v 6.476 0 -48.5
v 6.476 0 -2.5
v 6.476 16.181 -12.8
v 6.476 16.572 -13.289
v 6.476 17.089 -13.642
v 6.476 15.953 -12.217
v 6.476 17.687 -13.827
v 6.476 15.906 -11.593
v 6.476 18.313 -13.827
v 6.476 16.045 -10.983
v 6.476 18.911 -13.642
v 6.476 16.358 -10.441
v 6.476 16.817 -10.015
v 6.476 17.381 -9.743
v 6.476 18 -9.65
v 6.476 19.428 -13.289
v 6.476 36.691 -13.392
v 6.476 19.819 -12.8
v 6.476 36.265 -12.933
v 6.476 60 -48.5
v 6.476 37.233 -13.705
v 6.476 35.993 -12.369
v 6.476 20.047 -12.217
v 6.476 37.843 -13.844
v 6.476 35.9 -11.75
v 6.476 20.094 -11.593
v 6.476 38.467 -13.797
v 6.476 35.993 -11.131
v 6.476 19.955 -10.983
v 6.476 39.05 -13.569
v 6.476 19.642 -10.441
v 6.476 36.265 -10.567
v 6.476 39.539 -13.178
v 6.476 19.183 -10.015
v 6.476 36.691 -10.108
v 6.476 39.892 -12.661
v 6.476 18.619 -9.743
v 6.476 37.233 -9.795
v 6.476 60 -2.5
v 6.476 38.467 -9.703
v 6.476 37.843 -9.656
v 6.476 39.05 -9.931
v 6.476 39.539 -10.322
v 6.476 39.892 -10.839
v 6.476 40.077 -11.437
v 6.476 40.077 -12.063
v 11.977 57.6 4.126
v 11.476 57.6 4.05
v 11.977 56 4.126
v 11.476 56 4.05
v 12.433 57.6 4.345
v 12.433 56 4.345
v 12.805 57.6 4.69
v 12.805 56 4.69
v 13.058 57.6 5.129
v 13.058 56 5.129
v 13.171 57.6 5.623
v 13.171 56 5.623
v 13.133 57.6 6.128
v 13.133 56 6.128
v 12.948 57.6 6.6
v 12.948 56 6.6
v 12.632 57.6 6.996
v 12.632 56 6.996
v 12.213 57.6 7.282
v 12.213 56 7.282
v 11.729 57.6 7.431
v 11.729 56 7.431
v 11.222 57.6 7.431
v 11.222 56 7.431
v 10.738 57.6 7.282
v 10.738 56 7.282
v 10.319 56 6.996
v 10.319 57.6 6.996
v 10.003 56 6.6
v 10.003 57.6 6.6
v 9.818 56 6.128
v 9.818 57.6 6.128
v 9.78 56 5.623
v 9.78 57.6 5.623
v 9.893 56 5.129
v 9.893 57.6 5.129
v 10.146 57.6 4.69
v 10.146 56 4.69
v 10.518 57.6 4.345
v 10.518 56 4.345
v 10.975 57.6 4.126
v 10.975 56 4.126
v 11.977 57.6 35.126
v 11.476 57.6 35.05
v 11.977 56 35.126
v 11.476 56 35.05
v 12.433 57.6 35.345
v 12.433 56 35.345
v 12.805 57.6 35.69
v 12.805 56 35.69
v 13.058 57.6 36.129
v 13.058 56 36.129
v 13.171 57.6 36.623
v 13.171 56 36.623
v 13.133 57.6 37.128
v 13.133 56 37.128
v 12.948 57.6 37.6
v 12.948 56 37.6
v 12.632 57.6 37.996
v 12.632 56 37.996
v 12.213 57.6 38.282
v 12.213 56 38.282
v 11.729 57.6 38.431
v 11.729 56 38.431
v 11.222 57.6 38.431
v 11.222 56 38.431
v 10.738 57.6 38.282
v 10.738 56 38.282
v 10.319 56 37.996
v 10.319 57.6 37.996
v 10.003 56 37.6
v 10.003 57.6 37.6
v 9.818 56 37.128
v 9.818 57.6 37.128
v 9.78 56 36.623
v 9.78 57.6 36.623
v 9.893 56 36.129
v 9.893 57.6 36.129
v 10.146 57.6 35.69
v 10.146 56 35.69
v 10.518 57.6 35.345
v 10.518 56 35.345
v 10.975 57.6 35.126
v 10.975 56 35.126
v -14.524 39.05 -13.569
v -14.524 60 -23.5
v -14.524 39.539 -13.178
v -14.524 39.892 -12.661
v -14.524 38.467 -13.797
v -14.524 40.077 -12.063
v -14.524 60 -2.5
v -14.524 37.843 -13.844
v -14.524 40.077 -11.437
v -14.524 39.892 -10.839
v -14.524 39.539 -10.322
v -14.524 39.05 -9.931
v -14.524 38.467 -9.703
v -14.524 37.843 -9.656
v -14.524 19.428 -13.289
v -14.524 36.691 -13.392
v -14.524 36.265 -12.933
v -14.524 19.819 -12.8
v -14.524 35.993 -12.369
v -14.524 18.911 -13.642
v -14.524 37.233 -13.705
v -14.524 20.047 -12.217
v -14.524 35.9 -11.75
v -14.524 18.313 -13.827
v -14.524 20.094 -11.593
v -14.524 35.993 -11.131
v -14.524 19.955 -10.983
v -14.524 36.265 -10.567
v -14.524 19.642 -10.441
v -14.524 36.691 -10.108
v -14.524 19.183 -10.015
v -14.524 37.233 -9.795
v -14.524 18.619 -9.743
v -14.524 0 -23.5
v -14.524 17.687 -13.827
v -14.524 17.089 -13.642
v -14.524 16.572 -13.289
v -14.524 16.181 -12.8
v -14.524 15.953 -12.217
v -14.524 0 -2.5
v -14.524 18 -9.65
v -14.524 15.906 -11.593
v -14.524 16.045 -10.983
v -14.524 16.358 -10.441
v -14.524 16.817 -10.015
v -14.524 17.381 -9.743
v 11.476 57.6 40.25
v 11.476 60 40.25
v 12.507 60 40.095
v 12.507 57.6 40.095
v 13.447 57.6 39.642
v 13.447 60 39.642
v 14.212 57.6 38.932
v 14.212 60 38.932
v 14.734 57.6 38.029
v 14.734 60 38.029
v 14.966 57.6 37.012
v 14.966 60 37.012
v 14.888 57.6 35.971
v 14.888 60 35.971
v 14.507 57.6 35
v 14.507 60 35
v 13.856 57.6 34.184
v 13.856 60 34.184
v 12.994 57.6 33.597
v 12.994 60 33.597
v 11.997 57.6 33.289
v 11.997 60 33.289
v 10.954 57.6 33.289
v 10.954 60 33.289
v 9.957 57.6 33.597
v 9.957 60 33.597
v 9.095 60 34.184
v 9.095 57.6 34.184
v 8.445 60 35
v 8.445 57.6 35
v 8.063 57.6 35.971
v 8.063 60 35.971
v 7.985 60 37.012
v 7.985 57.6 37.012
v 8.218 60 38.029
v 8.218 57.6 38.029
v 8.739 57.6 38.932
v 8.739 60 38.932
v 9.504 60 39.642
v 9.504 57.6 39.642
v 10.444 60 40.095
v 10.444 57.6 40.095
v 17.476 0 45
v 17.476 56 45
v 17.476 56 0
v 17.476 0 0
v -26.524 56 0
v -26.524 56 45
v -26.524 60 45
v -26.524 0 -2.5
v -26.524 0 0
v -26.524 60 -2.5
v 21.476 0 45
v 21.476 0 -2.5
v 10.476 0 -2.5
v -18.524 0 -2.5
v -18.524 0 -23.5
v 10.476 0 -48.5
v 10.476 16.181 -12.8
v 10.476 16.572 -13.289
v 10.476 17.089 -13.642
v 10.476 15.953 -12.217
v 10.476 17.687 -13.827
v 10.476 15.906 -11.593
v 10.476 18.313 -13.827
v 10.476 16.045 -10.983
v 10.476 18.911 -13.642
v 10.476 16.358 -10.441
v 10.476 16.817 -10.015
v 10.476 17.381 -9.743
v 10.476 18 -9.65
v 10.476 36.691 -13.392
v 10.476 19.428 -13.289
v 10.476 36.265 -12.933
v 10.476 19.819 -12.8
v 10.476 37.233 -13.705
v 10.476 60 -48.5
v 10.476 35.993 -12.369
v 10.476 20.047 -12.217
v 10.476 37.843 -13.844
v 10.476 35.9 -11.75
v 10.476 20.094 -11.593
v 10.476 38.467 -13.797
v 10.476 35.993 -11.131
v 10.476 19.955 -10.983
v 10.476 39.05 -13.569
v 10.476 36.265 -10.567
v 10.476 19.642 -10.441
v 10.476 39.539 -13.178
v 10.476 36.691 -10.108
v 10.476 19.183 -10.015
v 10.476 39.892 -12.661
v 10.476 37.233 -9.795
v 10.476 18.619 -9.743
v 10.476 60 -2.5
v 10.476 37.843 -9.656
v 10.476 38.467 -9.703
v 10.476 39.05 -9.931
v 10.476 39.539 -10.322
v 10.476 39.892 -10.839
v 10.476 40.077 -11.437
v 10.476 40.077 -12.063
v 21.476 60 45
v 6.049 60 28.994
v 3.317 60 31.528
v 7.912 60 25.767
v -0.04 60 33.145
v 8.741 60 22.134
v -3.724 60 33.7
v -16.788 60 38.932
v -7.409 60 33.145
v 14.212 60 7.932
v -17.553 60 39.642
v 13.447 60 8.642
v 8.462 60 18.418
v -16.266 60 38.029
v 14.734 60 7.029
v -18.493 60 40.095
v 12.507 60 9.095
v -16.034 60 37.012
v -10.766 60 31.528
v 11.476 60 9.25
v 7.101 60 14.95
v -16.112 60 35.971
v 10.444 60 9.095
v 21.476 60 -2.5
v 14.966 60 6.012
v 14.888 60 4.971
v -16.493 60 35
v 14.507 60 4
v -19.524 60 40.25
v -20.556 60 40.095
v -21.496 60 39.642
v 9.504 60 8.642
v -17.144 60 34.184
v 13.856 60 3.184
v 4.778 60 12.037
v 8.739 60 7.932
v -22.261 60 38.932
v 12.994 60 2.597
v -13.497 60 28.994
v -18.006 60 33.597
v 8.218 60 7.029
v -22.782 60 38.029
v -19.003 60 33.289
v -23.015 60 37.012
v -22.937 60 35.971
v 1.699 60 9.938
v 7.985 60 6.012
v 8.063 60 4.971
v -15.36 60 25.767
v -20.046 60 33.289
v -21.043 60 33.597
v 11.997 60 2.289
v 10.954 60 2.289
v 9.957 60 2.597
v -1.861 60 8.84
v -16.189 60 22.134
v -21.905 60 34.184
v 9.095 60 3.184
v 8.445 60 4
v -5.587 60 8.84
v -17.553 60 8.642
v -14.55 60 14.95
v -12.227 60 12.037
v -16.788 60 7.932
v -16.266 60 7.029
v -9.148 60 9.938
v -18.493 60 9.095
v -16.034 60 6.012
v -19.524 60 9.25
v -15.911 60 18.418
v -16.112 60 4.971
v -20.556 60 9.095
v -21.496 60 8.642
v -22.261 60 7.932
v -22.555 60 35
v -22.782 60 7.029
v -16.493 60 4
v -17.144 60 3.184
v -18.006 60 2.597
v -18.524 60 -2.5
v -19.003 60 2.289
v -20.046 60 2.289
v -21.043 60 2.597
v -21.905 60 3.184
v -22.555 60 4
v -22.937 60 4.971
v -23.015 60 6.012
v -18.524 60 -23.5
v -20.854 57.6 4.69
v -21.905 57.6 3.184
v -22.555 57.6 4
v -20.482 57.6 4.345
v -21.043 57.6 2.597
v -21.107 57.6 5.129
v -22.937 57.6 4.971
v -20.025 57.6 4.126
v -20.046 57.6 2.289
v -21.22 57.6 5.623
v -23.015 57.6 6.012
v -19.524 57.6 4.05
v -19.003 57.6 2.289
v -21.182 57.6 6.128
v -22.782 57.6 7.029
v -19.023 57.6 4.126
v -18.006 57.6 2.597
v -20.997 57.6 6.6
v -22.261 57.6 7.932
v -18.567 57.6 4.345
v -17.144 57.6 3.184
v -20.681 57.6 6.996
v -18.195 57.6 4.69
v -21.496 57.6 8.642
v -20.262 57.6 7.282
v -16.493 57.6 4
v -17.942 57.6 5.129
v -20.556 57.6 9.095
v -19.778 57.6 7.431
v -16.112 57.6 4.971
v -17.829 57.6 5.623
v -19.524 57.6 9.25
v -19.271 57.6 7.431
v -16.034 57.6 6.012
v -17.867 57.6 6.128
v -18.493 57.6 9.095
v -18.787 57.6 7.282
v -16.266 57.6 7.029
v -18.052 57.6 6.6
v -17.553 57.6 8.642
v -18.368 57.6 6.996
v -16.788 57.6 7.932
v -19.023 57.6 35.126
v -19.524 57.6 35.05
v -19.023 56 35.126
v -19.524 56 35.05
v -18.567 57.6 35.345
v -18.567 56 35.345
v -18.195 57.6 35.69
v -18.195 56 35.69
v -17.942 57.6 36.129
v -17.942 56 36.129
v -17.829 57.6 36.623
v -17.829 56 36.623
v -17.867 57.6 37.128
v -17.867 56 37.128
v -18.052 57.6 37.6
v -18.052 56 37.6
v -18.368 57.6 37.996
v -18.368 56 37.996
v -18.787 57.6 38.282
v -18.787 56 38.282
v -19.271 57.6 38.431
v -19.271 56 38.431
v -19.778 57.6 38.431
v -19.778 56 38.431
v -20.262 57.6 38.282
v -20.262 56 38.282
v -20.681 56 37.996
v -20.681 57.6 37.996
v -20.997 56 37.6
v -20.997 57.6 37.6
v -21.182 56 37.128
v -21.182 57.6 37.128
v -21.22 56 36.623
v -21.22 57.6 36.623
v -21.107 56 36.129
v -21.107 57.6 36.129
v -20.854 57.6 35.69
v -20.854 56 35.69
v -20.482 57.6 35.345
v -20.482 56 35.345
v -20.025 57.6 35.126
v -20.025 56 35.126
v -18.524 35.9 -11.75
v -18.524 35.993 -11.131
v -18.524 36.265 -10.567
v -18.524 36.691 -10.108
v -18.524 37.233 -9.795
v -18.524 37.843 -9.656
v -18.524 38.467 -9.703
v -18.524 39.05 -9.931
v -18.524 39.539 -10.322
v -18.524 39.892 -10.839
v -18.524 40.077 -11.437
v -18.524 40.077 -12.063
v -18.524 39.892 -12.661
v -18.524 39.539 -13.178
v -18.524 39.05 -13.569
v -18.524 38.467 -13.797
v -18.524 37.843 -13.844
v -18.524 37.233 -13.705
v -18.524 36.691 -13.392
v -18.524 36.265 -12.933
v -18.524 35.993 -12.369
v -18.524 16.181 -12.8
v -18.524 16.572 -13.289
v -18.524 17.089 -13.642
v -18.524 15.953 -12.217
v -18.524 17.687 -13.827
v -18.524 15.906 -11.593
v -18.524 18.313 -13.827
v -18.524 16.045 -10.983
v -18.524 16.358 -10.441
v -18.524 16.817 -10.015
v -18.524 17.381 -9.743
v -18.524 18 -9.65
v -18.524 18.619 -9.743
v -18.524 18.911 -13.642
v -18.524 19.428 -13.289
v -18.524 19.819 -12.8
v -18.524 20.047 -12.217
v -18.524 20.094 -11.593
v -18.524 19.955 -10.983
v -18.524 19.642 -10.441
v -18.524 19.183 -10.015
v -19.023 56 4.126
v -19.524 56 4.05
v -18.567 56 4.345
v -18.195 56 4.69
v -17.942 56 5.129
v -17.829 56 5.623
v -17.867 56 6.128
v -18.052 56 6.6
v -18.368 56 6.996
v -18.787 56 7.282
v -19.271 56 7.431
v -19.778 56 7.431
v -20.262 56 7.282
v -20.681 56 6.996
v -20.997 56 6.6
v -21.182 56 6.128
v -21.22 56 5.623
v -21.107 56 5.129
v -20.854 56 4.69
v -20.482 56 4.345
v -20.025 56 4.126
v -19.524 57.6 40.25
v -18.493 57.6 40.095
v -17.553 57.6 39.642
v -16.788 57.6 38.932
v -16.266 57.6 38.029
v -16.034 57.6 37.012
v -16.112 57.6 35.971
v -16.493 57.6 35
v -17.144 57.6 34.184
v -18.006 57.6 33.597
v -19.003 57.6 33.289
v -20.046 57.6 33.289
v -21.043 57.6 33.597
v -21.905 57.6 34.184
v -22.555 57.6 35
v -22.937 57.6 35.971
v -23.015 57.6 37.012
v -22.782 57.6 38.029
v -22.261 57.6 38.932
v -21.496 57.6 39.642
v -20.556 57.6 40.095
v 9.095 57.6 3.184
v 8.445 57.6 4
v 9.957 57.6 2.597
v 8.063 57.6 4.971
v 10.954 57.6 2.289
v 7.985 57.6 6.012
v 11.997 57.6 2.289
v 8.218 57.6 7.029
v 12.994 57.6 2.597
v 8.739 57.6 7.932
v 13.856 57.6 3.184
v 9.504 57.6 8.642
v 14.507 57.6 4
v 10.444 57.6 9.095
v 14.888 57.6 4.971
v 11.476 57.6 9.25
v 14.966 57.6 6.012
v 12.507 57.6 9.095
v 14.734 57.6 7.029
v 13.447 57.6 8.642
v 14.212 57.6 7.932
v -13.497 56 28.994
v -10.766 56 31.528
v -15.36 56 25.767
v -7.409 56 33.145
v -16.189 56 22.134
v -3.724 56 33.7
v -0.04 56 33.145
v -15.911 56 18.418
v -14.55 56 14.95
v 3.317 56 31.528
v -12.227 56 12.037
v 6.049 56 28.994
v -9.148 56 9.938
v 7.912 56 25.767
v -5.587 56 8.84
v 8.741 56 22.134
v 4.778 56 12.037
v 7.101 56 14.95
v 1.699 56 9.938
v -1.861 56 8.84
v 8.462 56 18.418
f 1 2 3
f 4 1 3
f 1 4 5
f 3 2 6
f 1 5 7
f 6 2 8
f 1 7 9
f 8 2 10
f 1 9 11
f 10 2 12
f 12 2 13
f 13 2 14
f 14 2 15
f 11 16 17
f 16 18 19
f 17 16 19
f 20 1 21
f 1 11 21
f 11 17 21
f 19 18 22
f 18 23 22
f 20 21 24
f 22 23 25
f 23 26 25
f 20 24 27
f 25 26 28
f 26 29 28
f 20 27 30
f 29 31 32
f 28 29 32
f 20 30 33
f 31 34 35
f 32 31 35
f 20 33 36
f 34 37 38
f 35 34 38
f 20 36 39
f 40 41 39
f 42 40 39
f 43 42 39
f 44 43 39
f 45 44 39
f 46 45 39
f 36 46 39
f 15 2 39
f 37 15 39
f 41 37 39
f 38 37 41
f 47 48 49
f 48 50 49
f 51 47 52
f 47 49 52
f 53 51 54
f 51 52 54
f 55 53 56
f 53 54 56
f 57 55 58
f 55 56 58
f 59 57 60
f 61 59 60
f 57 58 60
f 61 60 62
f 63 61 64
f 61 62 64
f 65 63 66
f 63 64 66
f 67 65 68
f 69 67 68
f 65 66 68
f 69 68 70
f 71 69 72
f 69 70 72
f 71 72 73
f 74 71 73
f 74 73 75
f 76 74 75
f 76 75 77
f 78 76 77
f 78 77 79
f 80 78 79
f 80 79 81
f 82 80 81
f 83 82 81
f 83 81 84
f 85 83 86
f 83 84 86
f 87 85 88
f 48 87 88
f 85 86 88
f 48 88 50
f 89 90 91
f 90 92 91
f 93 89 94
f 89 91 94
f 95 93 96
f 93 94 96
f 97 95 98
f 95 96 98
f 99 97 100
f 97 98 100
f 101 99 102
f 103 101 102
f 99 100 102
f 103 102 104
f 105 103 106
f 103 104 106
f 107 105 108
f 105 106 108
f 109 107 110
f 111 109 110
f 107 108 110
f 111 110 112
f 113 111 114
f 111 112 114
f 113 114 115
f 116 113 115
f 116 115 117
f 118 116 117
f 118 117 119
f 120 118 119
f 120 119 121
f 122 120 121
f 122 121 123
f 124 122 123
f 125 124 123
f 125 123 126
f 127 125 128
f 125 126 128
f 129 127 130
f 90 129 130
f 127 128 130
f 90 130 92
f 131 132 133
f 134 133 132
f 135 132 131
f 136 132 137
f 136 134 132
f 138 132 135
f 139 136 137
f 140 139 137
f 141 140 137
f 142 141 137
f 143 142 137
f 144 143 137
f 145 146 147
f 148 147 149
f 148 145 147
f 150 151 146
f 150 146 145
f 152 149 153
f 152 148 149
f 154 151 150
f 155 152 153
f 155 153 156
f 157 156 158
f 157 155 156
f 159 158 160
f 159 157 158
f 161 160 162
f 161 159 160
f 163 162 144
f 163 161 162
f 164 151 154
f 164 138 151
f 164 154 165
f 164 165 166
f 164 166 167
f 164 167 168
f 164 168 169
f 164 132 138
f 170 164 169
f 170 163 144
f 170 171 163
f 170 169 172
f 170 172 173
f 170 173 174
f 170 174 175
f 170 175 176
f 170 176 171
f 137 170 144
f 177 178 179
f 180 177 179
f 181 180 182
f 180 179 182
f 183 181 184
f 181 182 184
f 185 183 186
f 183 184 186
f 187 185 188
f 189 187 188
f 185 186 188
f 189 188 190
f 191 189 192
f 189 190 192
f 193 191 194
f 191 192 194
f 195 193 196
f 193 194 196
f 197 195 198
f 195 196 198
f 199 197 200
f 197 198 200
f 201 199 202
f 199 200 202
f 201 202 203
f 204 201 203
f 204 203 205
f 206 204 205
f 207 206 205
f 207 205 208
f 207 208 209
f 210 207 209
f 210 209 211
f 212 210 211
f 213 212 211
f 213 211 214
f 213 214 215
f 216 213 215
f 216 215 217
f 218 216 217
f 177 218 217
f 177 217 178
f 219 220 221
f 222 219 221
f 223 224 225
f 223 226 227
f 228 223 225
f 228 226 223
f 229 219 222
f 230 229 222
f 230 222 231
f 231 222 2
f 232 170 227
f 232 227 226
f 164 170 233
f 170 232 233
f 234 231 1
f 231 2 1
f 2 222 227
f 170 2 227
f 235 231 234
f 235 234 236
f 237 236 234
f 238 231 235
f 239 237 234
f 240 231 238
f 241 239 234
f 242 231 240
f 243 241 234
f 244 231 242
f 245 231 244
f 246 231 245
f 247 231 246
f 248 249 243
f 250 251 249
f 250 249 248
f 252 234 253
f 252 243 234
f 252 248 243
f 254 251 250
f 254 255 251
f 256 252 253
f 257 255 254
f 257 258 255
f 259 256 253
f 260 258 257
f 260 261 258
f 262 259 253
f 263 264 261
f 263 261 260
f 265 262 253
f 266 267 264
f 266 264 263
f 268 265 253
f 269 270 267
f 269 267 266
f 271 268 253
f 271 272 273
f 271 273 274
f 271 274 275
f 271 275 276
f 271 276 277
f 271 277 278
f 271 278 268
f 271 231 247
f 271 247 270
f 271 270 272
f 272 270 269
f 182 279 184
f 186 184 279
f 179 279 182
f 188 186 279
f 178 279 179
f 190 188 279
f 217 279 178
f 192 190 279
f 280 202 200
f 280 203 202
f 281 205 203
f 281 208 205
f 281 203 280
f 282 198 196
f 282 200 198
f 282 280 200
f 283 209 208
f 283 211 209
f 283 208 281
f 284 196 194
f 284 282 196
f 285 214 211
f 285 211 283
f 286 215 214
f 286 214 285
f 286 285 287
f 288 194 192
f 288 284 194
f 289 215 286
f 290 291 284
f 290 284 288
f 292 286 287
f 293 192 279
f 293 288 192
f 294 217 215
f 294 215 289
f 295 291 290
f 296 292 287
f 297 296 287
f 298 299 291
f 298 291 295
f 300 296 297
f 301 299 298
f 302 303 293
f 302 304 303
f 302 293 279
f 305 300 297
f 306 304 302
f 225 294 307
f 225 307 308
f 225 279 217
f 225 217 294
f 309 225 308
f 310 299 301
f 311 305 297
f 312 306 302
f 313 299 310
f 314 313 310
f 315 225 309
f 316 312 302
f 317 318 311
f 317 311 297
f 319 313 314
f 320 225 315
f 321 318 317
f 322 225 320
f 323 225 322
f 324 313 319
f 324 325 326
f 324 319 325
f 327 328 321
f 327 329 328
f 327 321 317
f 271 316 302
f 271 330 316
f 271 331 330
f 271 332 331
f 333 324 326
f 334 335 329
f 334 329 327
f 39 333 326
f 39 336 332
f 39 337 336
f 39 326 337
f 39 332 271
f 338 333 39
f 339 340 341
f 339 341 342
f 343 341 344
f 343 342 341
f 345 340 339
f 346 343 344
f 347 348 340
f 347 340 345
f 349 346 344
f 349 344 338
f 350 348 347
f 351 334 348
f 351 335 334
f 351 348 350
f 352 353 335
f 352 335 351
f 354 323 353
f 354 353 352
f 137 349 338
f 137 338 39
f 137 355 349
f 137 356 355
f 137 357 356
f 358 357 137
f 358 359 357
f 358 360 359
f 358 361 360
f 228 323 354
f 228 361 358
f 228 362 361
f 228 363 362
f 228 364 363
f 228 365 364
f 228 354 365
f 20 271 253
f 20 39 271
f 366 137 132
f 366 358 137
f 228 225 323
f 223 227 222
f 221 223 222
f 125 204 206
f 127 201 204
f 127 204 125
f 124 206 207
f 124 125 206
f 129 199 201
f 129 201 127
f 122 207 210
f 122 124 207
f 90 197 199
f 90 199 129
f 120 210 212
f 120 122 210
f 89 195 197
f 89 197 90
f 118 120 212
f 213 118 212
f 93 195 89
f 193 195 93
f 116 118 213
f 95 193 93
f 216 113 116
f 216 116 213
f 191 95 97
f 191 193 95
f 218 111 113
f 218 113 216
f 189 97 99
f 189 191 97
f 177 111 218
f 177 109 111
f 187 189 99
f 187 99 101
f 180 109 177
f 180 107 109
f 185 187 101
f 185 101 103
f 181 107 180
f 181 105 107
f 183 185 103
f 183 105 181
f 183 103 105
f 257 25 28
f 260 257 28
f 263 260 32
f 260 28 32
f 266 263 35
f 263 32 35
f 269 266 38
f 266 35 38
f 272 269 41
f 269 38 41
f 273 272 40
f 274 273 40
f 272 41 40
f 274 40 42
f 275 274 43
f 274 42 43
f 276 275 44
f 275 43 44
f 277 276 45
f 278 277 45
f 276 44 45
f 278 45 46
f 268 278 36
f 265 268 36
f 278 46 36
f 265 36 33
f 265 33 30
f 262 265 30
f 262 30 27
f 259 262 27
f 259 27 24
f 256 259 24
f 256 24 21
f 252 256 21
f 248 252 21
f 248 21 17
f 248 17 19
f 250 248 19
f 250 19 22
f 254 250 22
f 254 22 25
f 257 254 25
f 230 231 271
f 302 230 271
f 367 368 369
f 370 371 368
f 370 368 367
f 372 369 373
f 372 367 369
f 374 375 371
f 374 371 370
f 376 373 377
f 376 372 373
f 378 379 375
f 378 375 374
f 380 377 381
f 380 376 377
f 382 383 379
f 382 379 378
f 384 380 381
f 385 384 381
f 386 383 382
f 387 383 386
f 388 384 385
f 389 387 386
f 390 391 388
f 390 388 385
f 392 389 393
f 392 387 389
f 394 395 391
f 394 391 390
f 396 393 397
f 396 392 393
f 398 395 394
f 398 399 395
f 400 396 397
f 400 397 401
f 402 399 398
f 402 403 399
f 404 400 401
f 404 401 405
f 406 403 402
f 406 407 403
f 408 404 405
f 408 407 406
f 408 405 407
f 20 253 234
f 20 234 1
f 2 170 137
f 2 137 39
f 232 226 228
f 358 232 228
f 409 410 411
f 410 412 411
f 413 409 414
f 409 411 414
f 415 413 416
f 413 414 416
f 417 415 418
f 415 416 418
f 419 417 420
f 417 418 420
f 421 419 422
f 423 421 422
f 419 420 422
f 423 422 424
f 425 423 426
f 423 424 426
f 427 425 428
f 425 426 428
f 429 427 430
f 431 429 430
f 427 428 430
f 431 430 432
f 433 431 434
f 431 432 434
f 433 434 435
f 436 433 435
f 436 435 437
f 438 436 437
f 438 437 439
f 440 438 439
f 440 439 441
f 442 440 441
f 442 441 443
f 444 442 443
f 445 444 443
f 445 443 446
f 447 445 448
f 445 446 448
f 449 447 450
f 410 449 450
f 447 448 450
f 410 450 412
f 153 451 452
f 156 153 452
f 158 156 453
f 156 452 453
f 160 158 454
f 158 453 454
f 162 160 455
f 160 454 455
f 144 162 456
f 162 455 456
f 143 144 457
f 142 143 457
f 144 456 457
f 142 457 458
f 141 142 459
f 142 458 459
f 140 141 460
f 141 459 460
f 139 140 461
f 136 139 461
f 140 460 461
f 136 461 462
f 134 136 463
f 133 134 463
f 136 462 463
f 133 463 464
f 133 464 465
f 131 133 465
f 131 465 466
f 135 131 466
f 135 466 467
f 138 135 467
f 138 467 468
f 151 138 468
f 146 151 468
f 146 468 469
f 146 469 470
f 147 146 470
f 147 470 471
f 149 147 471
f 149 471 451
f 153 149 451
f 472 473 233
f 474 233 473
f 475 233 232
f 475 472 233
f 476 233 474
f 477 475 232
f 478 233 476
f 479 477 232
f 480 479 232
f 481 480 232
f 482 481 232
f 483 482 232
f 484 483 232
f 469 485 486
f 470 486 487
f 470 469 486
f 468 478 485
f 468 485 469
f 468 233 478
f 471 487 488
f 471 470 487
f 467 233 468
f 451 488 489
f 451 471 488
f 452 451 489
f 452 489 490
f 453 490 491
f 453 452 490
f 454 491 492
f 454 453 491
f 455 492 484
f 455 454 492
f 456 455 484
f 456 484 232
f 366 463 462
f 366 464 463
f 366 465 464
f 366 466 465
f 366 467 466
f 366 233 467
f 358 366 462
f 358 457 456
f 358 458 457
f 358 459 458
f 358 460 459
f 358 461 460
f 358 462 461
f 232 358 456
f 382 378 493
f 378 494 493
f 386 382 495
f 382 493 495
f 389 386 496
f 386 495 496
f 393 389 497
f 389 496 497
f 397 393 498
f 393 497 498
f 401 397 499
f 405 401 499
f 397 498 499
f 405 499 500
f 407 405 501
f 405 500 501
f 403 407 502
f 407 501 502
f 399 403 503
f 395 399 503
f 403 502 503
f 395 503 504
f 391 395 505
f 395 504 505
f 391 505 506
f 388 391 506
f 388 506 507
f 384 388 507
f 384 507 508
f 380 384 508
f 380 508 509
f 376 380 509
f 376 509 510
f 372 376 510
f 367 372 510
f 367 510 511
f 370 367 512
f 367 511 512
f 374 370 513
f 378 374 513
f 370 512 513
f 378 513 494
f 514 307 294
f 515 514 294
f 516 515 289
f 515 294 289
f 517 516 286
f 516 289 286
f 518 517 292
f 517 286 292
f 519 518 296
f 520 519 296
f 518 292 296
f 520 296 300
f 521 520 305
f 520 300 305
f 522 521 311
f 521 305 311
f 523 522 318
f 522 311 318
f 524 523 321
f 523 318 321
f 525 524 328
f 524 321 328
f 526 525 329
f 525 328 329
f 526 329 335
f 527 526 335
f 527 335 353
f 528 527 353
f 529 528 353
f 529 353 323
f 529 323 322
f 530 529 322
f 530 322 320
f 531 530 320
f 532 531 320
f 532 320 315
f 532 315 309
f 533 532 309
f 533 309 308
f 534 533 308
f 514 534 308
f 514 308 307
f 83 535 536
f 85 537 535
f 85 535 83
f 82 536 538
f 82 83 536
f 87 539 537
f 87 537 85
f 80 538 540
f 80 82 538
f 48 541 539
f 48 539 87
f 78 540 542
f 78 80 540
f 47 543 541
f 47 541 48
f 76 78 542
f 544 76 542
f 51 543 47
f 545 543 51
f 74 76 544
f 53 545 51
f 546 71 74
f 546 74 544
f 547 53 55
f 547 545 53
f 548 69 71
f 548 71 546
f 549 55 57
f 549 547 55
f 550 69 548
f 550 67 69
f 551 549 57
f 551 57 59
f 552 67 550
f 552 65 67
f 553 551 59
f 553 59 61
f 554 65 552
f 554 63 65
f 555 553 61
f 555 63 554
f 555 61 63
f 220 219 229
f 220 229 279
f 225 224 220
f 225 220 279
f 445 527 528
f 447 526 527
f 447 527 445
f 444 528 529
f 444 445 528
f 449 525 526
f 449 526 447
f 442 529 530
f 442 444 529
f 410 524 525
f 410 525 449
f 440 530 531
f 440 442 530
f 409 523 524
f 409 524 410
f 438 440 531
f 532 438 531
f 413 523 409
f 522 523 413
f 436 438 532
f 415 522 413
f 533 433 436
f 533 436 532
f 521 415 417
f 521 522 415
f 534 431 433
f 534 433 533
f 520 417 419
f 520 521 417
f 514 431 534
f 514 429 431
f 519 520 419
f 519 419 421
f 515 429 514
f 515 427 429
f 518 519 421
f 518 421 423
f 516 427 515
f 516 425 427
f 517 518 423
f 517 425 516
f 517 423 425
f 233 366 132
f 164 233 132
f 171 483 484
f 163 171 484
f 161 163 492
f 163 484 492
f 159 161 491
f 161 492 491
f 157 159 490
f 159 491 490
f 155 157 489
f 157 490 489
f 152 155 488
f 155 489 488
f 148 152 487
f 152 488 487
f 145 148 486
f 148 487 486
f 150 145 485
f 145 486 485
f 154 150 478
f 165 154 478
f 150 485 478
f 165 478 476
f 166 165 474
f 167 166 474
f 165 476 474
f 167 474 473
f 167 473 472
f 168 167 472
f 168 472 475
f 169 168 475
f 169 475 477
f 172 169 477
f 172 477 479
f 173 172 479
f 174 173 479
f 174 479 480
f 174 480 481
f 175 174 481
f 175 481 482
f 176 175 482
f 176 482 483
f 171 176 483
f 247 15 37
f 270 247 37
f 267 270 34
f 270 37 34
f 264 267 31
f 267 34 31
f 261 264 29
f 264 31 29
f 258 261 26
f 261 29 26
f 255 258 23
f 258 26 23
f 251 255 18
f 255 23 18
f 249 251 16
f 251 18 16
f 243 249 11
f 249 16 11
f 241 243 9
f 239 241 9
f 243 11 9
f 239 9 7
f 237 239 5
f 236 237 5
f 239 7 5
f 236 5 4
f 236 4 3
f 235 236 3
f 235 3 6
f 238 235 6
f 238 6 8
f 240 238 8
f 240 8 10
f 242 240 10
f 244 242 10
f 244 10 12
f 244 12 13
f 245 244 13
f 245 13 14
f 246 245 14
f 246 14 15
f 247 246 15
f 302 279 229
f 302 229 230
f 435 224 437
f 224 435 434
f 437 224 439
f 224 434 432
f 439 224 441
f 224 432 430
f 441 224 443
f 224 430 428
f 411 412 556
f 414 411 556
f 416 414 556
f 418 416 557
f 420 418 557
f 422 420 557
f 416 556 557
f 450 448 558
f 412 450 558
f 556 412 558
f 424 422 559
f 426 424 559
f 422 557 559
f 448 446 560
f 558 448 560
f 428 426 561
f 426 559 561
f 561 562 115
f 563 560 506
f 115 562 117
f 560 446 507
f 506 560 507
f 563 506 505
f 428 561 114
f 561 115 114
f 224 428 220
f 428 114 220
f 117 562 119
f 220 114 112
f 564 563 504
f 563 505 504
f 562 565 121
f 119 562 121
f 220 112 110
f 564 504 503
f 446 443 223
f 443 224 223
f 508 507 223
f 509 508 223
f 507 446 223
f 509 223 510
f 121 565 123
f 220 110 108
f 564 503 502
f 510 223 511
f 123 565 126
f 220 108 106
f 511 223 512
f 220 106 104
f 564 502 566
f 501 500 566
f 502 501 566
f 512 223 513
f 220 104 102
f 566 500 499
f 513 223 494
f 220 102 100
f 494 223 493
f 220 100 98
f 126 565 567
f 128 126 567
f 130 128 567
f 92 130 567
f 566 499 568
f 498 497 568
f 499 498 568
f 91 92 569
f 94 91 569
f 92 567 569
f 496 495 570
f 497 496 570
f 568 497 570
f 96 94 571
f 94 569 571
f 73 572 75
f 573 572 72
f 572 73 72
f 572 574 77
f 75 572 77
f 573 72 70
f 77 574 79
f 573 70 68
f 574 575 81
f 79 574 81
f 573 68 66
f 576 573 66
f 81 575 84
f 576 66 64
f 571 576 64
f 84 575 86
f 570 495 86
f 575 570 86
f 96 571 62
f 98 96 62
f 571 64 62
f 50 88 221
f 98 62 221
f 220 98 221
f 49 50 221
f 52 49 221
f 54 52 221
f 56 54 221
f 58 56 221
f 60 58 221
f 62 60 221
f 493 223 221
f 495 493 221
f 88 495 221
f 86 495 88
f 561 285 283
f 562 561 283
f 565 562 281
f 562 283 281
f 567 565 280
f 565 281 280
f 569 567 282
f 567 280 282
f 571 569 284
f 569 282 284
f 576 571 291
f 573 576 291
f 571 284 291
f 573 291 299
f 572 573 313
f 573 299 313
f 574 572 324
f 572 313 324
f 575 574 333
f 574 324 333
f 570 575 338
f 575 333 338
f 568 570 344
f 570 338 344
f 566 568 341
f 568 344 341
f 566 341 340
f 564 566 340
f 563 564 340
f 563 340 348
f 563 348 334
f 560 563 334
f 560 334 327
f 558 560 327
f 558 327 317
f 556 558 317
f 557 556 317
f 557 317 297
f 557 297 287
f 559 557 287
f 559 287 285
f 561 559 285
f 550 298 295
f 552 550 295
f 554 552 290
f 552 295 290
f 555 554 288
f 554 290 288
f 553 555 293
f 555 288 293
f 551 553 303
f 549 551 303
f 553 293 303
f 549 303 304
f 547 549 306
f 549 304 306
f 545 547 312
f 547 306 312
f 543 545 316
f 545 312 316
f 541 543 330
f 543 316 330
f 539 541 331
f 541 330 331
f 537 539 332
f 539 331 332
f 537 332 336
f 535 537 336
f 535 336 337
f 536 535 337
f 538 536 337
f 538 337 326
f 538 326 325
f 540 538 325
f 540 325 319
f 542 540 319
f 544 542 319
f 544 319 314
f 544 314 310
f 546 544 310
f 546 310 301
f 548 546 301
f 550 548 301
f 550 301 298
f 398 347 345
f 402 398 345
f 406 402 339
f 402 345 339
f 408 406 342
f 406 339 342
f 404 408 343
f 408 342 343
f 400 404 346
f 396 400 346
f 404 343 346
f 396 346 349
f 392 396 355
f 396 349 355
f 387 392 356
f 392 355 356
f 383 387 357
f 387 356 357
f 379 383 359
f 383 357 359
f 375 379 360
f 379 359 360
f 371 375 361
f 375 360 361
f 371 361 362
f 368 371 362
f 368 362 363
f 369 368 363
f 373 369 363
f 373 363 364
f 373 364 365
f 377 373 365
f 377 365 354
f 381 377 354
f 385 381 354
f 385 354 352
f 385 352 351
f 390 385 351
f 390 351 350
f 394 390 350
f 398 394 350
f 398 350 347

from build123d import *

# Parameters (mm, degrees)
SKETCH1_W                                           = 45
SKETCH1_H                                           = 60
BOSS_EXTRUDE1_DEPTH                                 = 23.5
SKETCH2_W                                           = 45
SKETCH2_H                                           = 4
BOSS_EXTRUDE2_DEPTH                                 = 45
SKETCH4_W                                           = 21
SKETCH4_H                                           = 21
CUT_EXTRUDE1_DEPTH                                  = 80.552141881
CUT_EXTRUDE2_REACH                                  = 81.552
SKETCH5_R                                           = 12.5
SKETCH13_W                                          = 21
SKETCH13_H                                          = 60
CUT_EXTRUDE3_DEPTH                                  = 8
SKETCH14_W                                          = 21
SKETCH14_H                                          = 60
CUT_EXTRUDE4_DEPTH                                  = 8
SKETCH22_W                                          = 4
SKETCH22_H                                          = 60
BOSS_EXTRUDE6_DEPTH                                 = 25
CBORE_FOR_M3_PAN_HEAD_MACHINE_SCREW1_D              = 3.4
CBORE_FOR_M3_PAN_HEAD_MACHINE_SCREW1_DEPTH          = 4.001
CBORE_FOR_M3_PAN_HEAD_MACHINE_SCREW1_CBORE_D        = 7
CBORE_FOR_M3_PAN_HEAD_MACHINE_SCREW1_CBORE_DEPTH    = 2.4
CBORE_FOR_M3_PAN_HEAD_MACHINE_SCREW1_ON_D           = 3.4
CBORE_FOR_M3_PAN_HEAD_MACHINE_SCREW1_ON_DEPTH       = 4.001
CBORE_FOR_M3_PAN_HEAD_MACHINE_SCREW1_ON_CBORE_D     = 7
CBORE_FOR_M3_PAN_HEAD_MACHINE_SCREW1_ON_CBORE_DEPTH = 2.4
SKETCH16_R                                          = 2.1
CUT_EXTRUDE5_DEPTH                                  = 86.564303305
BOSS_EXTRUDE5_DEPTH                                 = 3
BOSS_EXTRUDE5_DEPTH_BACK                            = 1
SKETCH21_W                                          = 47.5
SKETCH21_H                                          = 60


with BuildPart() as part:
    # Sketch1 → Boss-Extrude1 (new body)
    with BuildSketch(Plane.XY):
        with Locations((-4.024390244, 30)):
            Rectangle(SKETCH1_W, SKETCH1_H)
    extrude(amount=-BOSS_EXTRUDE1_DEPTH)

    # Sketch2 → Boss-Extrude2 (add)
    with BuildSketch(Plane.XY):
        with Locations((-4.024390244, 58)):
            Rectangle(SKETCH2_W, SKETCH2_H)
    extrude(amount=BOSS_EXTRUDE2_DEPTH)

    # Sketch4 → Cut-Extrude1 (cut, through all)
    with BuildSketch(Plane.XZ):
        with Locations((-4.024390244, -13)):
            Rectangle(SKETCH4_W, SKETCH4_H)
    extrude(amount=-CUT_EXTRUDE1_DEPTH, mode=Mode.SUBTRACT)

    # Sketch5 → Cut-Extrude2 (cut, up to next)
    with BuildSketch(Plane(origin=(0, 60, 0), x_dir=(1, 0, 0), z_dir=(0, 1, 0)), mode=Mode.PRIVATE) as cut_extrude2_sk1:
        with Locations(Location((-3.724390244, -21.2, 0), (0, 0, 270))):
            Circle(SKETCH5_R)
    cut_extrude2_tool1 = extrude(cut_extrude2_sk1.sketch, amount=-CUT_EXTRUDE2_REACH, mode=Mode.PRIVATE) & part.part
    add(cut_extrude2_tool1.solids().sort_by_distance((-3.72439, 60, 21.2))[0], mode=Mode.SUBTRACT)

    # Sketch13 → Cut-Extrude3 (cut)
    with BuildSketch(Plane(origin=(18.475609756, 0, 0), x_dir=(0, 0, -1), z_dir=(1, 0, 0))):
        with Locations((13, 30)):
            Rectangle(SKETCH13_W, SKETCH13_H)
    extrude(amount=-CUT_EXTRUDE3_DEPTH, mode=Mode.SUBTRACT)

    # Sketch14 → Cut-Extrude4 (cut)
    with BuildSketch(Plane.ZY.offset(26.524390244)):
        with Locations((-13, 30)):
            Rectangle(SKETCH14_W, SKETCH14_H)
    extrude(amount=-CUT_EXTRUDE4_DEPTH, mode=Mode.SUBTRACT)

    # Sketch22 → Boss-Extrude6 (add)
    with BuildSketch(Plane(origin=(0, 0, -23.5), x_dir=(-1, 0, 0), z_dir=(0, 0, -1))):
        with Locations((-8.475609756, 30)):
            Rectangle(SKETCH22_W, SKETCH22_H)
    extrude(amount=BOSS_EXTRUDE6_DEPTH)

    # CBORE for M3 Pan Head Machine Screw1
    with Locations(Plane(origin=(-19.524390244, 60, 5.75), x_dir=(0, 0, 1), z_dir=(0, 1, 0))):
        with Locations((0, 0), (31, 31), (31, 0), (0, 31)):
            CounterBoreHole(CBORE_FOR_M3_PAN_HEAD_MACHINE_SCREW1_D / 2, CBORE_FOR_M3_PAN_HEAD_MACHINE_SCREW1_CBORE_D / 2, CBORE_FOR_M3_PAN_HEAD_MACHINE_SCREW1_CBORE_DEPTH, depth=CBORE_FOR_M3_PAN_HEAD_MACHINE_SCREW1_DEPTH)

    # CBORE for M3 Pan Head Machine Screw1 on
    with Locations(Plane(origin=(-42.937475152, 0, 35.255713856), x_dir=(0, 0, 1), z_dir=(0, 1, 0))):
        with Locations((0, 0)):
            CounterBoreHole(CBORE_FOR_M3_PAN_HEAD_MACHINE_SCREW1_ON_D / 2, CBORE_FOR_M3_PAN_HEAD_MACHINE_SCREW1_ON_CBORE_D / 2, CBORE_FOR_M3_PAN_HEAD_MACHINE_SCREW1_ON_CBORE_DEPTH, depth=CBORE_FOR_M3_PAN_HEAD_MACHINE_SCREW1_ON_DEPTH)

    # Sketch16 → Cut-Extrude5 (cut, through all)
    with BuildSketch(Plane.ZY.offset(18.524390244)):
        with Locations(Location((-11.75, 38, 0), (0, 0, 270))):
            Circle(SKETCH16_R)
        with Locations((-11.75, 18)):
            Circle(SKETCH16_R)
    extrude(amount=-CUT_EXTRUDE5_DEPTH, mode=Mode.SUBTRACT)

    # Sketch21 → Boss-Extrude5 (add, two sides: drawn at the far end of the back side and taken through both)
    with BuildSketch(Plane(origin=(18.475609756, 0, 0), x_dir=(0, 0, -1), z_dir=(1, 0, 0)).offset(-BOSS_EXTRUDE5_DEPTH_BACK)):
        with Locations((-21.25, 30)):
            Rectangle(SKETCH21_W, SKETCH21_H)
    extrude(amount=BOSS_EXTRUDE5_DEPTH + BOSS_EXTRUDE5_DEPTH_BACK)


solid = part.part
